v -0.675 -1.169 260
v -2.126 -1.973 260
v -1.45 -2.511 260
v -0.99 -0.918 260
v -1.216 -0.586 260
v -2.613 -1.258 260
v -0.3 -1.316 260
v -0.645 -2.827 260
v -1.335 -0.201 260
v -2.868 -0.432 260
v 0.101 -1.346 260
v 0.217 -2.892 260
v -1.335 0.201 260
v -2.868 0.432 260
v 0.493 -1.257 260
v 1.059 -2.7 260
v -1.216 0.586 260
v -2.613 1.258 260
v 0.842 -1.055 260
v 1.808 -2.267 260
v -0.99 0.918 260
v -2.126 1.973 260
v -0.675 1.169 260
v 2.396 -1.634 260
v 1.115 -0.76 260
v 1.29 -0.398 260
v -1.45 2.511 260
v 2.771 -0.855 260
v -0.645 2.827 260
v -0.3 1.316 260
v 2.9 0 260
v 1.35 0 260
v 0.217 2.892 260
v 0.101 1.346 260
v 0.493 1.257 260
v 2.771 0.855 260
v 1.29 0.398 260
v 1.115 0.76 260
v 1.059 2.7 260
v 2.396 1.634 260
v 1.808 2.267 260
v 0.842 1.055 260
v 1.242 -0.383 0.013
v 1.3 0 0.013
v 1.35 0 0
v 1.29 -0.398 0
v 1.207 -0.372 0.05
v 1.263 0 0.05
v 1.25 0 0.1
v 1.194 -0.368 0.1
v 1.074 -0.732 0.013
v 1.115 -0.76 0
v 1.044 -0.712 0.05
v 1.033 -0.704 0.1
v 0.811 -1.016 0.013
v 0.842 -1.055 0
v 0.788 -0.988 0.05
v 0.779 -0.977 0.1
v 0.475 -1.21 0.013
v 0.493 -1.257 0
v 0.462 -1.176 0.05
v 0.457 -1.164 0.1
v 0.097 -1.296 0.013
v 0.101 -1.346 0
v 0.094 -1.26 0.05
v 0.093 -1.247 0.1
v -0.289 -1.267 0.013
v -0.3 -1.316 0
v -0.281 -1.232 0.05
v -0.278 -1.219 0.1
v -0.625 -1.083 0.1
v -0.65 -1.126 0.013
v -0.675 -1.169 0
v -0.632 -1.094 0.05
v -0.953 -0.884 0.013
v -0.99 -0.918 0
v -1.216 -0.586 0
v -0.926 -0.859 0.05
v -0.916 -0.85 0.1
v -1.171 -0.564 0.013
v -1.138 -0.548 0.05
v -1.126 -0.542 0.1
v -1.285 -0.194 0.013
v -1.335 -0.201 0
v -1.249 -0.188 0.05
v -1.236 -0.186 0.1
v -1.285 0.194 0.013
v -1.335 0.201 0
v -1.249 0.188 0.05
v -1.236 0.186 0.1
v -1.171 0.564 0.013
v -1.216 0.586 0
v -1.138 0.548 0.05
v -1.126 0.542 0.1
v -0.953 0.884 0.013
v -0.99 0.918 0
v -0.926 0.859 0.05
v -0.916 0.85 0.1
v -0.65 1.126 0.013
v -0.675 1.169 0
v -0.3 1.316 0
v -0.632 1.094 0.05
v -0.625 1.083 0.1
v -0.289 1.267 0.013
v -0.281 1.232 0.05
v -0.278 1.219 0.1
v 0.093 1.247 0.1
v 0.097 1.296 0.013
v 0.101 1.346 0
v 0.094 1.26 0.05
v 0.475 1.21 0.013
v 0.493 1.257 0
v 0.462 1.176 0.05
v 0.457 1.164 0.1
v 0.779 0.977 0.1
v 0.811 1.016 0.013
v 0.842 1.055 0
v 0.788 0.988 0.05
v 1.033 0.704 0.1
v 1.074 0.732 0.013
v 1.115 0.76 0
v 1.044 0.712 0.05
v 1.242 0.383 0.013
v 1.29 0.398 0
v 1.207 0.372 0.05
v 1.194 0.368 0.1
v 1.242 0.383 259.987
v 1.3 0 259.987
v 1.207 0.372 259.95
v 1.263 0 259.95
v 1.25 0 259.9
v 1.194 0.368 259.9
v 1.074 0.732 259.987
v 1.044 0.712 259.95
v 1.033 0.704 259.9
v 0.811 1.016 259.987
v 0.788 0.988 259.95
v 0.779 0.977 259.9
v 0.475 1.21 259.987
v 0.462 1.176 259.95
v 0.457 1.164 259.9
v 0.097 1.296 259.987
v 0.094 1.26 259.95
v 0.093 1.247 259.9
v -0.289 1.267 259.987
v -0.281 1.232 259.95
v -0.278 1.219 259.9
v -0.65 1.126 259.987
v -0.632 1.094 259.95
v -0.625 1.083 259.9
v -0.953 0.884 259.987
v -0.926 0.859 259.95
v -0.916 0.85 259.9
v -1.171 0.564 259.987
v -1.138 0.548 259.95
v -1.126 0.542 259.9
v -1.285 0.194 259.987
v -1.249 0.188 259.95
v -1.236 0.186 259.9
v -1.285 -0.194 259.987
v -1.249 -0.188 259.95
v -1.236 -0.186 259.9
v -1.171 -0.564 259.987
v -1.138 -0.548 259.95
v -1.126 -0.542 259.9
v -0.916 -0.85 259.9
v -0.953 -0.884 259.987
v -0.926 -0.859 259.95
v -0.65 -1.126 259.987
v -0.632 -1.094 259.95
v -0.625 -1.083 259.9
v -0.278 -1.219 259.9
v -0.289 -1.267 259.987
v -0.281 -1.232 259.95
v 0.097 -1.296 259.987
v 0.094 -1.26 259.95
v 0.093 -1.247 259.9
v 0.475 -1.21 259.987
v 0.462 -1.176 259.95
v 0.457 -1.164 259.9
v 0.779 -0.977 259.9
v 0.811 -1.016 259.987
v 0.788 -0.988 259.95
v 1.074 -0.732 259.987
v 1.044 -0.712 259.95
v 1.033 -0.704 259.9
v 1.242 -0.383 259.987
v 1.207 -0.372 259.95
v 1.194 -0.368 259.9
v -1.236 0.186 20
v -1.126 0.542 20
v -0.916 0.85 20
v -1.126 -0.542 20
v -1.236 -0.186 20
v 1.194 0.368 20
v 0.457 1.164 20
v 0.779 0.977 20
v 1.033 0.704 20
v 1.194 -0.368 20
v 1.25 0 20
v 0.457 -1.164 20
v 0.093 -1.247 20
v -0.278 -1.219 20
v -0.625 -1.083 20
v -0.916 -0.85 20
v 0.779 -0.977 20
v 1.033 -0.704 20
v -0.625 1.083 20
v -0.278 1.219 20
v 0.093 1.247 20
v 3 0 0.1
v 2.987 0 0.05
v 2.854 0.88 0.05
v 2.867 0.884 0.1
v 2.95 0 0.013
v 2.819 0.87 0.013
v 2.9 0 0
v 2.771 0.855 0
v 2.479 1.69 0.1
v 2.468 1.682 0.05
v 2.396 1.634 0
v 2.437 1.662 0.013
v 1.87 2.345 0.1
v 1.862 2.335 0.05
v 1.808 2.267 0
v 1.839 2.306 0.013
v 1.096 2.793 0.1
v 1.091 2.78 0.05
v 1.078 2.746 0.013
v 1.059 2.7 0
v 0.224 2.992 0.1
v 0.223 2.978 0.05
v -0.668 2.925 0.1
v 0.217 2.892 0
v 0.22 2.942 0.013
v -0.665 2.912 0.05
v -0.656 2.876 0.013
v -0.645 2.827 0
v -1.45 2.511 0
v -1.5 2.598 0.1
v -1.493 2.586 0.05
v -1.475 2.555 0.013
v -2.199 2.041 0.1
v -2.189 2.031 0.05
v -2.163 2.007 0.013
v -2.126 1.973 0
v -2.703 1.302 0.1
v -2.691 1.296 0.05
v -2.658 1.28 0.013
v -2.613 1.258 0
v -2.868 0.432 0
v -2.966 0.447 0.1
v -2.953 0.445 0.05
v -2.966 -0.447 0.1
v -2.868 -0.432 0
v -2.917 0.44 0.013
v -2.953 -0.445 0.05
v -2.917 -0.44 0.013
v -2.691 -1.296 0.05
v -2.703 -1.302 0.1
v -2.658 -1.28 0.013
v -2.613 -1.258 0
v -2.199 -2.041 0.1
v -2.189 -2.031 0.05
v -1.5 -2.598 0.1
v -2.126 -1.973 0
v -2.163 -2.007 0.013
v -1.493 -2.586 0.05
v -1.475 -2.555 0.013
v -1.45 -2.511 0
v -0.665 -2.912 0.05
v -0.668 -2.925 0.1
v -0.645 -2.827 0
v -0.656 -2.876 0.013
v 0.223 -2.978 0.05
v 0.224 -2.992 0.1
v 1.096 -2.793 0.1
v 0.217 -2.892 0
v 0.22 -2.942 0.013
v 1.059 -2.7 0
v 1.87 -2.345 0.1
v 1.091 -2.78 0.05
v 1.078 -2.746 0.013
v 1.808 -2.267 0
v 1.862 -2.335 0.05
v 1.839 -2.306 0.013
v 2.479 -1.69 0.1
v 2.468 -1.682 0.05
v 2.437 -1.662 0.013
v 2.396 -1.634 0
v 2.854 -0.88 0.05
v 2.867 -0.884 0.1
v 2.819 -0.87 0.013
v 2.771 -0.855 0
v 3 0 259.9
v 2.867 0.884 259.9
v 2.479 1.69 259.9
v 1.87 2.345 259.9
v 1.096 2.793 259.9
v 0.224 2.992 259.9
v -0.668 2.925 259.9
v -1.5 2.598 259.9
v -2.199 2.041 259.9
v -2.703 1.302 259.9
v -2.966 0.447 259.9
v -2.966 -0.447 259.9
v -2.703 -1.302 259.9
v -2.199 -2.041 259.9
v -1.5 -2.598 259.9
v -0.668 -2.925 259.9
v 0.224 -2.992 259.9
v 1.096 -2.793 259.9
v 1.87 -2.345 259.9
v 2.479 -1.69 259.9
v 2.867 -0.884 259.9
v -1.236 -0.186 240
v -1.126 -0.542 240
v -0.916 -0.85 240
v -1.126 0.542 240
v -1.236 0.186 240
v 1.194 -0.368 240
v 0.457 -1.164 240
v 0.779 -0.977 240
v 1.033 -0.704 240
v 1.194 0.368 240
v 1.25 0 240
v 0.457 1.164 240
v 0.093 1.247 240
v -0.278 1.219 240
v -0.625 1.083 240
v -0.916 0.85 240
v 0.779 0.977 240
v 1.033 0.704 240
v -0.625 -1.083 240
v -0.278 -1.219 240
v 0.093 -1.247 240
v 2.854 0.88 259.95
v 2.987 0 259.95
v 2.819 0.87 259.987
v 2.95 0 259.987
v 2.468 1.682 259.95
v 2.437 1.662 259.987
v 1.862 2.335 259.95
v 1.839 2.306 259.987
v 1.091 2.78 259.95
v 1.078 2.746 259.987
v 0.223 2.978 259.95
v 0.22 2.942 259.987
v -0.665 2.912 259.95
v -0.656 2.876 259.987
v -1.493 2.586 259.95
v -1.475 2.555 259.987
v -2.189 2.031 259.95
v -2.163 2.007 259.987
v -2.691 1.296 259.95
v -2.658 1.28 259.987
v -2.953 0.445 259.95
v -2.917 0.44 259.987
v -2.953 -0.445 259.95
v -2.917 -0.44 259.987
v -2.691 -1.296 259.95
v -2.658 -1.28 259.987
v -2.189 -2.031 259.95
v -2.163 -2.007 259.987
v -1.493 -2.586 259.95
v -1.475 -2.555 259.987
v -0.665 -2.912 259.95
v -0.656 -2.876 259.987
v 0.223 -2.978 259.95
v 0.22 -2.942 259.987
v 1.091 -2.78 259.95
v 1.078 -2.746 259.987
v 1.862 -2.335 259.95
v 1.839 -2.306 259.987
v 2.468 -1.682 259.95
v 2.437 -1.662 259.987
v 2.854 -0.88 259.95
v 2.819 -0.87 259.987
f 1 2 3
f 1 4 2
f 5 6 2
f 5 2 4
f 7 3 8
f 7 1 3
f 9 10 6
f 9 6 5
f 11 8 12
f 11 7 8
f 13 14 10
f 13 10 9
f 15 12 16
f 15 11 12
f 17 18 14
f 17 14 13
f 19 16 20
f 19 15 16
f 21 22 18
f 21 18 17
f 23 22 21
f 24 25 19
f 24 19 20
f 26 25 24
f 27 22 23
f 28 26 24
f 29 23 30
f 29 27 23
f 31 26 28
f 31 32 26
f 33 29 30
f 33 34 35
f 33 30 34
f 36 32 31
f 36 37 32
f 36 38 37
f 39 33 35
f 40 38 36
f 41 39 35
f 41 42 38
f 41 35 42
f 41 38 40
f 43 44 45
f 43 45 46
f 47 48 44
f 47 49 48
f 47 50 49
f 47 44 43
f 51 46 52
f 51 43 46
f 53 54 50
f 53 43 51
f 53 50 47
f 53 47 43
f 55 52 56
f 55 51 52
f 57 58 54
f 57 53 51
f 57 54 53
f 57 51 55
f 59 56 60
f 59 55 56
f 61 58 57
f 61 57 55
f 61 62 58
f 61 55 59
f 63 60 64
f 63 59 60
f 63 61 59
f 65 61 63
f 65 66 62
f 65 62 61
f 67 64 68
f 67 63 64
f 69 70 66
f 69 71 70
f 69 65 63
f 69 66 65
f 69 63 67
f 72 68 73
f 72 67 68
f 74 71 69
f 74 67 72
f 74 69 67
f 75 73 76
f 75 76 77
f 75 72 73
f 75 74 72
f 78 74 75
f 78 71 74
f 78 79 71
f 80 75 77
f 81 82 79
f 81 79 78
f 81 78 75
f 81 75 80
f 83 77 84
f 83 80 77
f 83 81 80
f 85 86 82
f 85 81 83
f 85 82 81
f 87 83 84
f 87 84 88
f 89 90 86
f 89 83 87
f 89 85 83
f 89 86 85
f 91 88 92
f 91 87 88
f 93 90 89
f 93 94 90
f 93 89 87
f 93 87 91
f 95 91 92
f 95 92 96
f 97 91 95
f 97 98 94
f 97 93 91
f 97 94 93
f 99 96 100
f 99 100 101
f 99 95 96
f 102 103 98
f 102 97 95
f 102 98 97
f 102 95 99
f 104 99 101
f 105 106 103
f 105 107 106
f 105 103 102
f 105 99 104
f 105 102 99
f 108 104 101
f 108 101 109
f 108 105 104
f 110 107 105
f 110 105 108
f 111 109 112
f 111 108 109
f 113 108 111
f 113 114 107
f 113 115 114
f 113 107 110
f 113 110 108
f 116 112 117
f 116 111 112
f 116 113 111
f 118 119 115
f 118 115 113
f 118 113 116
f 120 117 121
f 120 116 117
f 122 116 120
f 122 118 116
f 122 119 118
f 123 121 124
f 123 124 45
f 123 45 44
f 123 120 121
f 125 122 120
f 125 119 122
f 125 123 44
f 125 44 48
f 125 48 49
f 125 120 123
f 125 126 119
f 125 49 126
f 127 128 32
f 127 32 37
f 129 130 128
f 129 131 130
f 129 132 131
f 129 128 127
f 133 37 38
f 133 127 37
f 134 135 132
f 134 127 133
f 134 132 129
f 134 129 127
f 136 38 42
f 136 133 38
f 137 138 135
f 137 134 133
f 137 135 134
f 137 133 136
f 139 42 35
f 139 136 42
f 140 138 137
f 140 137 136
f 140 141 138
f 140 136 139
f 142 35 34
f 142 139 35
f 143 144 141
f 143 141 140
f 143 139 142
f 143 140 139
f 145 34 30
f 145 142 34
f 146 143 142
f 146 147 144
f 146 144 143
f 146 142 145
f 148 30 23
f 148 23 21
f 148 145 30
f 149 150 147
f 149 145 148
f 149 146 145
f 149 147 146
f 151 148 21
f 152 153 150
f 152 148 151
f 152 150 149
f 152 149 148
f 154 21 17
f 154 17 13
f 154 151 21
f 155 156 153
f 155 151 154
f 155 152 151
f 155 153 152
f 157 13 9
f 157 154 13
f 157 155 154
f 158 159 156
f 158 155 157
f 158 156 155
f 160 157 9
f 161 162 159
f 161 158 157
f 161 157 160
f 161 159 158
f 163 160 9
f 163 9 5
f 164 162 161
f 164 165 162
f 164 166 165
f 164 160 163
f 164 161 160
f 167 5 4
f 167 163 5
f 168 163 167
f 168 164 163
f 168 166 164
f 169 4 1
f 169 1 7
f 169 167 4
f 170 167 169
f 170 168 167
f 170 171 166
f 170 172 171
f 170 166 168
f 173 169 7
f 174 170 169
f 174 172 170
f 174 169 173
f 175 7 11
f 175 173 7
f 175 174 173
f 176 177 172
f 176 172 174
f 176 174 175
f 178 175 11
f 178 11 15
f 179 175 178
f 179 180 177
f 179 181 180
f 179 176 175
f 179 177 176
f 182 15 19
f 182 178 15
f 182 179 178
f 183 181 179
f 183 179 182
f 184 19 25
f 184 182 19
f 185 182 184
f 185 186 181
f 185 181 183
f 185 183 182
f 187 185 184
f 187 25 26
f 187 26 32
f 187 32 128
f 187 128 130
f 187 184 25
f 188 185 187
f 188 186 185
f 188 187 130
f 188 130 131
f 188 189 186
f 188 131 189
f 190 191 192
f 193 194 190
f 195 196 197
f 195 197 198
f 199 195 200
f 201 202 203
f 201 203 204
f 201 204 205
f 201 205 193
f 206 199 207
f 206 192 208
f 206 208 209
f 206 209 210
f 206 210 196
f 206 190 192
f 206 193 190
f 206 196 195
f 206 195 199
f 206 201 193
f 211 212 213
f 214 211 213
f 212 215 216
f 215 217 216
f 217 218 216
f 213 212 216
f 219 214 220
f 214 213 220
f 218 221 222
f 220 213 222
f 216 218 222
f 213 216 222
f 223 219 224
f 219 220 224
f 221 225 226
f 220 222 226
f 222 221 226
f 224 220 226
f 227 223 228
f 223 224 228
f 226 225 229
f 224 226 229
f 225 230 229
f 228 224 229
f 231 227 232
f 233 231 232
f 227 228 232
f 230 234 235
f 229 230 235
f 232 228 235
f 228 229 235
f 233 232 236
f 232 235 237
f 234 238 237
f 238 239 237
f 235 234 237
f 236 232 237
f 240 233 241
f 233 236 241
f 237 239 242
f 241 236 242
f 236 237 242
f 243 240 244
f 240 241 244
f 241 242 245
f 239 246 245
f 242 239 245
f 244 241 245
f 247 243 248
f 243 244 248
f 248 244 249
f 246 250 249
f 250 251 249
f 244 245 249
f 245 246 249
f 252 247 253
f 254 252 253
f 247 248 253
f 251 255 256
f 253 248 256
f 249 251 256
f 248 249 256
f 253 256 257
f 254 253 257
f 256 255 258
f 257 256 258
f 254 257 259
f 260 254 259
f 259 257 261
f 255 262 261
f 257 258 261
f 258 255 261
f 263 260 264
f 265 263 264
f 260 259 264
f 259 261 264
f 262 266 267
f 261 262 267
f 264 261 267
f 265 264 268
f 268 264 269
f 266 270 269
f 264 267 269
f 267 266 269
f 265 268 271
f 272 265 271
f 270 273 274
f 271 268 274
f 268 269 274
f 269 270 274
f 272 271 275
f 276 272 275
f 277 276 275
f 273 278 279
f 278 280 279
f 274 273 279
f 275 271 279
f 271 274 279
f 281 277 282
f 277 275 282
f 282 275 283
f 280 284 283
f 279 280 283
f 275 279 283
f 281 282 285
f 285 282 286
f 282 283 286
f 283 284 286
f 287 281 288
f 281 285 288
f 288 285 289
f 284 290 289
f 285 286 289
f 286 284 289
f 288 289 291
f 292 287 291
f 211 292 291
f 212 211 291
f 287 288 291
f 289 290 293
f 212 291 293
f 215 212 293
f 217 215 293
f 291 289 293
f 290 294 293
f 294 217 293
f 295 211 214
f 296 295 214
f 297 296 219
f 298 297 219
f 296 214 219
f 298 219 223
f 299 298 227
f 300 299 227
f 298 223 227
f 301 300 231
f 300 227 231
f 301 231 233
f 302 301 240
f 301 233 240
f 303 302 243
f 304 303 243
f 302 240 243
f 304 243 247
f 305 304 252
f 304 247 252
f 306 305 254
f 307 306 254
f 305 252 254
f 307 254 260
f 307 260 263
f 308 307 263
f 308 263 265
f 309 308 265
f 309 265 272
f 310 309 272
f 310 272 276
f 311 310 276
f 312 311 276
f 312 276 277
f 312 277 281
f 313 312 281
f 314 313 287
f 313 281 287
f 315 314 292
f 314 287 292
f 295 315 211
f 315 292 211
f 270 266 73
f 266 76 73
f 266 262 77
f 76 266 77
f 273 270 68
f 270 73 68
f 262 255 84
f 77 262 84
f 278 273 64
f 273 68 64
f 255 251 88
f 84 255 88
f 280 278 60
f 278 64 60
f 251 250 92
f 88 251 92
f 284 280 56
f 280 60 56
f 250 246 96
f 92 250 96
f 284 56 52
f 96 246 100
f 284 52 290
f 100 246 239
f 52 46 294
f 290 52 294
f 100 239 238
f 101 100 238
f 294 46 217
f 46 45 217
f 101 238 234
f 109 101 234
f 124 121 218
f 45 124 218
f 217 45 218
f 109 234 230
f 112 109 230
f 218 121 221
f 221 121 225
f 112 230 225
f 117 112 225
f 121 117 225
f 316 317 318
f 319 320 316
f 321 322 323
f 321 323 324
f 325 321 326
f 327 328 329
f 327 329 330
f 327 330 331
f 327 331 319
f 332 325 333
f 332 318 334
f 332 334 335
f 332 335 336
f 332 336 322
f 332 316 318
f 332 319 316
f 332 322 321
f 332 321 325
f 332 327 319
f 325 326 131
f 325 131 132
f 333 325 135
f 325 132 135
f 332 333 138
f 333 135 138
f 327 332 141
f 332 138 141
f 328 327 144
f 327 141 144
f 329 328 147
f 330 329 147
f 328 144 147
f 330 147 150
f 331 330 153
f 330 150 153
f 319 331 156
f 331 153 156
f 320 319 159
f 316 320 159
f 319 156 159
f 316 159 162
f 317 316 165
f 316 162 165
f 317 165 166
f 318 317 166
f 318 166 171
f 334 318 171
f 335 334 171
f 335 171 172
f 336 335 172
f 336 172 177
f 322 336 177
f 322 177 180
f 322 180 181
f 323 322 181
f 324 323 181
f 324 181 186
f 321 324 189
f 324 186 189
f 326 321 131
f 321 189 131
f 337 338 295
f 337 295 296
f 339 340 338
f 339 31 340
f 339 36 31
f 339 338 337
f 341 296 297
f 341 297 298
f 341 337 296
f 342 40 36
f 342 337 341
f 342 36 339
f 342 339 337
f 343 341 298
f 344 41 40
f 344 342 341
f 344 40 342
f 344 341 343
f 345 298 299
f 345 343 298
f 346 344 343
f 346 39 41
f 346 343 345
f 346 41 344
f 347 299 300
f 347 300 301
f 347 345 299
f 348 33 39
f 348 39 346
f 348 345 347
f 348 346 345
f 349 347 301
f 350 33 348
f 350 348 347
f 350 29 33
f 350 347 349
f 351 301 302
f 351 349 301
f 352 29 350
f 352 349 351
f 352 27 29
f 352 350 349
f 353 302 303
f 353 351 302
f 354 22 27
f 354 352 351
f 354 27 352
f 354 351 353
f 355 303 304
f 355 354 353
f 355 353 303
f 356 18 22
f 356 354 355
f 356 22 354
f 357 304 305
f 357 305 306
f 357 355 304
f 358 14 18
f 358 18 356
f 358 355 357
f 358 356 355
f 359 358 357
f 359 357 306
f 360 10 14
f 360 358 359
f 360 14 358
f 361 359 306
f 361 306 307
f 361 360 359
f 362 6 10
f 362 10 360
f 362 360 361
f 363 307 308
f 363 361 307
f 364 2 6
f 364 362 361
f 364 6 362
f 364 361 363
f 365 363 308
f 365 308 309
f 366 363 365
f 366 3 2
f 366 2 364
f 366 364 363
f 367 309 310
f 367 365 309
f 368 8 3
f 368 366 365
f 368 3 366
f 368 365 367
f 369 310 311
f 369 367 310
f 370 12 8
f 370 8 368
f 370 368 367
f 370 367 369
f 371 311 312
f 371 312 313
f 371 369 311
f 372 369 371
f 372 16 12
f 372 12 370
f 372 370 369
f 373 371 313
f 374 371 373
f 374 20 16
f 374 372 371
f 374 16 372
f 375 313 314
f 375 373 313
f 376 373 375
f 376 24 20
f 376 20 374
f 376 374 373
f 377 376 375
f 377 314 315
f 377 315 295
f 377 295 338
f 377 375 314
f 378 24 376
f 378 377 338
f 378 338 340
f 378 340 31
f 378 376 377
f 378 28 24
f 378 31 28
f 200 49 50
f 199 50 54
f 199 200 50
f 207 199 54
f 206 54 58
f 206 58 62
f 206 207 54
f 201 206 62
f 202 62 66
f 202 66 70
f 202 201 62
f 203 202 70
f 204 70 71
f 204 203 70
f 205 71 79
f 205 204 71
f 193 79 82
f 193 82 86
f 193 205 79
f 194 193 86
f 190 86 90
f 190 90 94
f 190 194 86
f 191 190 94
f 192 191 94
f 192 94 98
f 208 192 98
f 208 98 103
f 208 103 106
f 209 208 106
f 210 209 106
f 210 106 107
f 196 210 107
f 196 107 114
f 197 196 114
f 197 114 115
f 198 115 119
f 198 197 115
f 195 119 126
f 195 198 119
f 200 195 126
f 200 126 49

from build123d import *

# Parameters (mm, degrees)
SKETCH1_R          = 3
EXTRUDE1_DEPTH     = 260
SKETCH2_R          = 1.25
CUT_EXTRUDE1_DEPTH = 20
CUT_EXTRUDE2_START = -20
SKETCH3_R          = 1.25
CUT_EXTRUDE2_DEPTH = 20
FILLET1_R          = 0.1


with BuildPart() as part:
    # Sketch1 → Extrude1 (new body)
    with BuildSketch(Plane.XY):
        Circle(SKETCH1_R)
    extrude(amount=EXTRUDE1_DEPTH)

    # Sketch2 → Cut-Extrude1 (cut)
    with BuildSketch(Plane.XY.offset(260)):
        Circle(SKETCH2_R)
    extrude(amount=-CUT_EXTRUDE1_DEPTH, mode=Mode.SUBTRACT)

    # Sketch3 → Cut-Extrude2 (cut)
    with BuildSketch(Plane(origin=(0, 0, 0), x_dir=(-1, 0, 0), z_dir=(0, 0, -1)).offset(CUT_EXTRUDE2_START)):
        with Locations(Location((0, 0, 0), (0, 0, 180))):
            Circle(SKETCH3_R)
    extrude(amount=CUT_EXTRUDE2_DEPTH, mode=Mode.SUBTRACT)

    # Fillet1
    fillet1_edges = [part.edges().sort_by_distance(p)[0] for p in [
        (-1.25, 0, 0),
        (-3, 0, 0),
        (-3, 0, 260),
        (-1.25, 0, 260),
    ]]
    fillet(fillet1_edges, radius=FILLET1_R)


solid = part.part
